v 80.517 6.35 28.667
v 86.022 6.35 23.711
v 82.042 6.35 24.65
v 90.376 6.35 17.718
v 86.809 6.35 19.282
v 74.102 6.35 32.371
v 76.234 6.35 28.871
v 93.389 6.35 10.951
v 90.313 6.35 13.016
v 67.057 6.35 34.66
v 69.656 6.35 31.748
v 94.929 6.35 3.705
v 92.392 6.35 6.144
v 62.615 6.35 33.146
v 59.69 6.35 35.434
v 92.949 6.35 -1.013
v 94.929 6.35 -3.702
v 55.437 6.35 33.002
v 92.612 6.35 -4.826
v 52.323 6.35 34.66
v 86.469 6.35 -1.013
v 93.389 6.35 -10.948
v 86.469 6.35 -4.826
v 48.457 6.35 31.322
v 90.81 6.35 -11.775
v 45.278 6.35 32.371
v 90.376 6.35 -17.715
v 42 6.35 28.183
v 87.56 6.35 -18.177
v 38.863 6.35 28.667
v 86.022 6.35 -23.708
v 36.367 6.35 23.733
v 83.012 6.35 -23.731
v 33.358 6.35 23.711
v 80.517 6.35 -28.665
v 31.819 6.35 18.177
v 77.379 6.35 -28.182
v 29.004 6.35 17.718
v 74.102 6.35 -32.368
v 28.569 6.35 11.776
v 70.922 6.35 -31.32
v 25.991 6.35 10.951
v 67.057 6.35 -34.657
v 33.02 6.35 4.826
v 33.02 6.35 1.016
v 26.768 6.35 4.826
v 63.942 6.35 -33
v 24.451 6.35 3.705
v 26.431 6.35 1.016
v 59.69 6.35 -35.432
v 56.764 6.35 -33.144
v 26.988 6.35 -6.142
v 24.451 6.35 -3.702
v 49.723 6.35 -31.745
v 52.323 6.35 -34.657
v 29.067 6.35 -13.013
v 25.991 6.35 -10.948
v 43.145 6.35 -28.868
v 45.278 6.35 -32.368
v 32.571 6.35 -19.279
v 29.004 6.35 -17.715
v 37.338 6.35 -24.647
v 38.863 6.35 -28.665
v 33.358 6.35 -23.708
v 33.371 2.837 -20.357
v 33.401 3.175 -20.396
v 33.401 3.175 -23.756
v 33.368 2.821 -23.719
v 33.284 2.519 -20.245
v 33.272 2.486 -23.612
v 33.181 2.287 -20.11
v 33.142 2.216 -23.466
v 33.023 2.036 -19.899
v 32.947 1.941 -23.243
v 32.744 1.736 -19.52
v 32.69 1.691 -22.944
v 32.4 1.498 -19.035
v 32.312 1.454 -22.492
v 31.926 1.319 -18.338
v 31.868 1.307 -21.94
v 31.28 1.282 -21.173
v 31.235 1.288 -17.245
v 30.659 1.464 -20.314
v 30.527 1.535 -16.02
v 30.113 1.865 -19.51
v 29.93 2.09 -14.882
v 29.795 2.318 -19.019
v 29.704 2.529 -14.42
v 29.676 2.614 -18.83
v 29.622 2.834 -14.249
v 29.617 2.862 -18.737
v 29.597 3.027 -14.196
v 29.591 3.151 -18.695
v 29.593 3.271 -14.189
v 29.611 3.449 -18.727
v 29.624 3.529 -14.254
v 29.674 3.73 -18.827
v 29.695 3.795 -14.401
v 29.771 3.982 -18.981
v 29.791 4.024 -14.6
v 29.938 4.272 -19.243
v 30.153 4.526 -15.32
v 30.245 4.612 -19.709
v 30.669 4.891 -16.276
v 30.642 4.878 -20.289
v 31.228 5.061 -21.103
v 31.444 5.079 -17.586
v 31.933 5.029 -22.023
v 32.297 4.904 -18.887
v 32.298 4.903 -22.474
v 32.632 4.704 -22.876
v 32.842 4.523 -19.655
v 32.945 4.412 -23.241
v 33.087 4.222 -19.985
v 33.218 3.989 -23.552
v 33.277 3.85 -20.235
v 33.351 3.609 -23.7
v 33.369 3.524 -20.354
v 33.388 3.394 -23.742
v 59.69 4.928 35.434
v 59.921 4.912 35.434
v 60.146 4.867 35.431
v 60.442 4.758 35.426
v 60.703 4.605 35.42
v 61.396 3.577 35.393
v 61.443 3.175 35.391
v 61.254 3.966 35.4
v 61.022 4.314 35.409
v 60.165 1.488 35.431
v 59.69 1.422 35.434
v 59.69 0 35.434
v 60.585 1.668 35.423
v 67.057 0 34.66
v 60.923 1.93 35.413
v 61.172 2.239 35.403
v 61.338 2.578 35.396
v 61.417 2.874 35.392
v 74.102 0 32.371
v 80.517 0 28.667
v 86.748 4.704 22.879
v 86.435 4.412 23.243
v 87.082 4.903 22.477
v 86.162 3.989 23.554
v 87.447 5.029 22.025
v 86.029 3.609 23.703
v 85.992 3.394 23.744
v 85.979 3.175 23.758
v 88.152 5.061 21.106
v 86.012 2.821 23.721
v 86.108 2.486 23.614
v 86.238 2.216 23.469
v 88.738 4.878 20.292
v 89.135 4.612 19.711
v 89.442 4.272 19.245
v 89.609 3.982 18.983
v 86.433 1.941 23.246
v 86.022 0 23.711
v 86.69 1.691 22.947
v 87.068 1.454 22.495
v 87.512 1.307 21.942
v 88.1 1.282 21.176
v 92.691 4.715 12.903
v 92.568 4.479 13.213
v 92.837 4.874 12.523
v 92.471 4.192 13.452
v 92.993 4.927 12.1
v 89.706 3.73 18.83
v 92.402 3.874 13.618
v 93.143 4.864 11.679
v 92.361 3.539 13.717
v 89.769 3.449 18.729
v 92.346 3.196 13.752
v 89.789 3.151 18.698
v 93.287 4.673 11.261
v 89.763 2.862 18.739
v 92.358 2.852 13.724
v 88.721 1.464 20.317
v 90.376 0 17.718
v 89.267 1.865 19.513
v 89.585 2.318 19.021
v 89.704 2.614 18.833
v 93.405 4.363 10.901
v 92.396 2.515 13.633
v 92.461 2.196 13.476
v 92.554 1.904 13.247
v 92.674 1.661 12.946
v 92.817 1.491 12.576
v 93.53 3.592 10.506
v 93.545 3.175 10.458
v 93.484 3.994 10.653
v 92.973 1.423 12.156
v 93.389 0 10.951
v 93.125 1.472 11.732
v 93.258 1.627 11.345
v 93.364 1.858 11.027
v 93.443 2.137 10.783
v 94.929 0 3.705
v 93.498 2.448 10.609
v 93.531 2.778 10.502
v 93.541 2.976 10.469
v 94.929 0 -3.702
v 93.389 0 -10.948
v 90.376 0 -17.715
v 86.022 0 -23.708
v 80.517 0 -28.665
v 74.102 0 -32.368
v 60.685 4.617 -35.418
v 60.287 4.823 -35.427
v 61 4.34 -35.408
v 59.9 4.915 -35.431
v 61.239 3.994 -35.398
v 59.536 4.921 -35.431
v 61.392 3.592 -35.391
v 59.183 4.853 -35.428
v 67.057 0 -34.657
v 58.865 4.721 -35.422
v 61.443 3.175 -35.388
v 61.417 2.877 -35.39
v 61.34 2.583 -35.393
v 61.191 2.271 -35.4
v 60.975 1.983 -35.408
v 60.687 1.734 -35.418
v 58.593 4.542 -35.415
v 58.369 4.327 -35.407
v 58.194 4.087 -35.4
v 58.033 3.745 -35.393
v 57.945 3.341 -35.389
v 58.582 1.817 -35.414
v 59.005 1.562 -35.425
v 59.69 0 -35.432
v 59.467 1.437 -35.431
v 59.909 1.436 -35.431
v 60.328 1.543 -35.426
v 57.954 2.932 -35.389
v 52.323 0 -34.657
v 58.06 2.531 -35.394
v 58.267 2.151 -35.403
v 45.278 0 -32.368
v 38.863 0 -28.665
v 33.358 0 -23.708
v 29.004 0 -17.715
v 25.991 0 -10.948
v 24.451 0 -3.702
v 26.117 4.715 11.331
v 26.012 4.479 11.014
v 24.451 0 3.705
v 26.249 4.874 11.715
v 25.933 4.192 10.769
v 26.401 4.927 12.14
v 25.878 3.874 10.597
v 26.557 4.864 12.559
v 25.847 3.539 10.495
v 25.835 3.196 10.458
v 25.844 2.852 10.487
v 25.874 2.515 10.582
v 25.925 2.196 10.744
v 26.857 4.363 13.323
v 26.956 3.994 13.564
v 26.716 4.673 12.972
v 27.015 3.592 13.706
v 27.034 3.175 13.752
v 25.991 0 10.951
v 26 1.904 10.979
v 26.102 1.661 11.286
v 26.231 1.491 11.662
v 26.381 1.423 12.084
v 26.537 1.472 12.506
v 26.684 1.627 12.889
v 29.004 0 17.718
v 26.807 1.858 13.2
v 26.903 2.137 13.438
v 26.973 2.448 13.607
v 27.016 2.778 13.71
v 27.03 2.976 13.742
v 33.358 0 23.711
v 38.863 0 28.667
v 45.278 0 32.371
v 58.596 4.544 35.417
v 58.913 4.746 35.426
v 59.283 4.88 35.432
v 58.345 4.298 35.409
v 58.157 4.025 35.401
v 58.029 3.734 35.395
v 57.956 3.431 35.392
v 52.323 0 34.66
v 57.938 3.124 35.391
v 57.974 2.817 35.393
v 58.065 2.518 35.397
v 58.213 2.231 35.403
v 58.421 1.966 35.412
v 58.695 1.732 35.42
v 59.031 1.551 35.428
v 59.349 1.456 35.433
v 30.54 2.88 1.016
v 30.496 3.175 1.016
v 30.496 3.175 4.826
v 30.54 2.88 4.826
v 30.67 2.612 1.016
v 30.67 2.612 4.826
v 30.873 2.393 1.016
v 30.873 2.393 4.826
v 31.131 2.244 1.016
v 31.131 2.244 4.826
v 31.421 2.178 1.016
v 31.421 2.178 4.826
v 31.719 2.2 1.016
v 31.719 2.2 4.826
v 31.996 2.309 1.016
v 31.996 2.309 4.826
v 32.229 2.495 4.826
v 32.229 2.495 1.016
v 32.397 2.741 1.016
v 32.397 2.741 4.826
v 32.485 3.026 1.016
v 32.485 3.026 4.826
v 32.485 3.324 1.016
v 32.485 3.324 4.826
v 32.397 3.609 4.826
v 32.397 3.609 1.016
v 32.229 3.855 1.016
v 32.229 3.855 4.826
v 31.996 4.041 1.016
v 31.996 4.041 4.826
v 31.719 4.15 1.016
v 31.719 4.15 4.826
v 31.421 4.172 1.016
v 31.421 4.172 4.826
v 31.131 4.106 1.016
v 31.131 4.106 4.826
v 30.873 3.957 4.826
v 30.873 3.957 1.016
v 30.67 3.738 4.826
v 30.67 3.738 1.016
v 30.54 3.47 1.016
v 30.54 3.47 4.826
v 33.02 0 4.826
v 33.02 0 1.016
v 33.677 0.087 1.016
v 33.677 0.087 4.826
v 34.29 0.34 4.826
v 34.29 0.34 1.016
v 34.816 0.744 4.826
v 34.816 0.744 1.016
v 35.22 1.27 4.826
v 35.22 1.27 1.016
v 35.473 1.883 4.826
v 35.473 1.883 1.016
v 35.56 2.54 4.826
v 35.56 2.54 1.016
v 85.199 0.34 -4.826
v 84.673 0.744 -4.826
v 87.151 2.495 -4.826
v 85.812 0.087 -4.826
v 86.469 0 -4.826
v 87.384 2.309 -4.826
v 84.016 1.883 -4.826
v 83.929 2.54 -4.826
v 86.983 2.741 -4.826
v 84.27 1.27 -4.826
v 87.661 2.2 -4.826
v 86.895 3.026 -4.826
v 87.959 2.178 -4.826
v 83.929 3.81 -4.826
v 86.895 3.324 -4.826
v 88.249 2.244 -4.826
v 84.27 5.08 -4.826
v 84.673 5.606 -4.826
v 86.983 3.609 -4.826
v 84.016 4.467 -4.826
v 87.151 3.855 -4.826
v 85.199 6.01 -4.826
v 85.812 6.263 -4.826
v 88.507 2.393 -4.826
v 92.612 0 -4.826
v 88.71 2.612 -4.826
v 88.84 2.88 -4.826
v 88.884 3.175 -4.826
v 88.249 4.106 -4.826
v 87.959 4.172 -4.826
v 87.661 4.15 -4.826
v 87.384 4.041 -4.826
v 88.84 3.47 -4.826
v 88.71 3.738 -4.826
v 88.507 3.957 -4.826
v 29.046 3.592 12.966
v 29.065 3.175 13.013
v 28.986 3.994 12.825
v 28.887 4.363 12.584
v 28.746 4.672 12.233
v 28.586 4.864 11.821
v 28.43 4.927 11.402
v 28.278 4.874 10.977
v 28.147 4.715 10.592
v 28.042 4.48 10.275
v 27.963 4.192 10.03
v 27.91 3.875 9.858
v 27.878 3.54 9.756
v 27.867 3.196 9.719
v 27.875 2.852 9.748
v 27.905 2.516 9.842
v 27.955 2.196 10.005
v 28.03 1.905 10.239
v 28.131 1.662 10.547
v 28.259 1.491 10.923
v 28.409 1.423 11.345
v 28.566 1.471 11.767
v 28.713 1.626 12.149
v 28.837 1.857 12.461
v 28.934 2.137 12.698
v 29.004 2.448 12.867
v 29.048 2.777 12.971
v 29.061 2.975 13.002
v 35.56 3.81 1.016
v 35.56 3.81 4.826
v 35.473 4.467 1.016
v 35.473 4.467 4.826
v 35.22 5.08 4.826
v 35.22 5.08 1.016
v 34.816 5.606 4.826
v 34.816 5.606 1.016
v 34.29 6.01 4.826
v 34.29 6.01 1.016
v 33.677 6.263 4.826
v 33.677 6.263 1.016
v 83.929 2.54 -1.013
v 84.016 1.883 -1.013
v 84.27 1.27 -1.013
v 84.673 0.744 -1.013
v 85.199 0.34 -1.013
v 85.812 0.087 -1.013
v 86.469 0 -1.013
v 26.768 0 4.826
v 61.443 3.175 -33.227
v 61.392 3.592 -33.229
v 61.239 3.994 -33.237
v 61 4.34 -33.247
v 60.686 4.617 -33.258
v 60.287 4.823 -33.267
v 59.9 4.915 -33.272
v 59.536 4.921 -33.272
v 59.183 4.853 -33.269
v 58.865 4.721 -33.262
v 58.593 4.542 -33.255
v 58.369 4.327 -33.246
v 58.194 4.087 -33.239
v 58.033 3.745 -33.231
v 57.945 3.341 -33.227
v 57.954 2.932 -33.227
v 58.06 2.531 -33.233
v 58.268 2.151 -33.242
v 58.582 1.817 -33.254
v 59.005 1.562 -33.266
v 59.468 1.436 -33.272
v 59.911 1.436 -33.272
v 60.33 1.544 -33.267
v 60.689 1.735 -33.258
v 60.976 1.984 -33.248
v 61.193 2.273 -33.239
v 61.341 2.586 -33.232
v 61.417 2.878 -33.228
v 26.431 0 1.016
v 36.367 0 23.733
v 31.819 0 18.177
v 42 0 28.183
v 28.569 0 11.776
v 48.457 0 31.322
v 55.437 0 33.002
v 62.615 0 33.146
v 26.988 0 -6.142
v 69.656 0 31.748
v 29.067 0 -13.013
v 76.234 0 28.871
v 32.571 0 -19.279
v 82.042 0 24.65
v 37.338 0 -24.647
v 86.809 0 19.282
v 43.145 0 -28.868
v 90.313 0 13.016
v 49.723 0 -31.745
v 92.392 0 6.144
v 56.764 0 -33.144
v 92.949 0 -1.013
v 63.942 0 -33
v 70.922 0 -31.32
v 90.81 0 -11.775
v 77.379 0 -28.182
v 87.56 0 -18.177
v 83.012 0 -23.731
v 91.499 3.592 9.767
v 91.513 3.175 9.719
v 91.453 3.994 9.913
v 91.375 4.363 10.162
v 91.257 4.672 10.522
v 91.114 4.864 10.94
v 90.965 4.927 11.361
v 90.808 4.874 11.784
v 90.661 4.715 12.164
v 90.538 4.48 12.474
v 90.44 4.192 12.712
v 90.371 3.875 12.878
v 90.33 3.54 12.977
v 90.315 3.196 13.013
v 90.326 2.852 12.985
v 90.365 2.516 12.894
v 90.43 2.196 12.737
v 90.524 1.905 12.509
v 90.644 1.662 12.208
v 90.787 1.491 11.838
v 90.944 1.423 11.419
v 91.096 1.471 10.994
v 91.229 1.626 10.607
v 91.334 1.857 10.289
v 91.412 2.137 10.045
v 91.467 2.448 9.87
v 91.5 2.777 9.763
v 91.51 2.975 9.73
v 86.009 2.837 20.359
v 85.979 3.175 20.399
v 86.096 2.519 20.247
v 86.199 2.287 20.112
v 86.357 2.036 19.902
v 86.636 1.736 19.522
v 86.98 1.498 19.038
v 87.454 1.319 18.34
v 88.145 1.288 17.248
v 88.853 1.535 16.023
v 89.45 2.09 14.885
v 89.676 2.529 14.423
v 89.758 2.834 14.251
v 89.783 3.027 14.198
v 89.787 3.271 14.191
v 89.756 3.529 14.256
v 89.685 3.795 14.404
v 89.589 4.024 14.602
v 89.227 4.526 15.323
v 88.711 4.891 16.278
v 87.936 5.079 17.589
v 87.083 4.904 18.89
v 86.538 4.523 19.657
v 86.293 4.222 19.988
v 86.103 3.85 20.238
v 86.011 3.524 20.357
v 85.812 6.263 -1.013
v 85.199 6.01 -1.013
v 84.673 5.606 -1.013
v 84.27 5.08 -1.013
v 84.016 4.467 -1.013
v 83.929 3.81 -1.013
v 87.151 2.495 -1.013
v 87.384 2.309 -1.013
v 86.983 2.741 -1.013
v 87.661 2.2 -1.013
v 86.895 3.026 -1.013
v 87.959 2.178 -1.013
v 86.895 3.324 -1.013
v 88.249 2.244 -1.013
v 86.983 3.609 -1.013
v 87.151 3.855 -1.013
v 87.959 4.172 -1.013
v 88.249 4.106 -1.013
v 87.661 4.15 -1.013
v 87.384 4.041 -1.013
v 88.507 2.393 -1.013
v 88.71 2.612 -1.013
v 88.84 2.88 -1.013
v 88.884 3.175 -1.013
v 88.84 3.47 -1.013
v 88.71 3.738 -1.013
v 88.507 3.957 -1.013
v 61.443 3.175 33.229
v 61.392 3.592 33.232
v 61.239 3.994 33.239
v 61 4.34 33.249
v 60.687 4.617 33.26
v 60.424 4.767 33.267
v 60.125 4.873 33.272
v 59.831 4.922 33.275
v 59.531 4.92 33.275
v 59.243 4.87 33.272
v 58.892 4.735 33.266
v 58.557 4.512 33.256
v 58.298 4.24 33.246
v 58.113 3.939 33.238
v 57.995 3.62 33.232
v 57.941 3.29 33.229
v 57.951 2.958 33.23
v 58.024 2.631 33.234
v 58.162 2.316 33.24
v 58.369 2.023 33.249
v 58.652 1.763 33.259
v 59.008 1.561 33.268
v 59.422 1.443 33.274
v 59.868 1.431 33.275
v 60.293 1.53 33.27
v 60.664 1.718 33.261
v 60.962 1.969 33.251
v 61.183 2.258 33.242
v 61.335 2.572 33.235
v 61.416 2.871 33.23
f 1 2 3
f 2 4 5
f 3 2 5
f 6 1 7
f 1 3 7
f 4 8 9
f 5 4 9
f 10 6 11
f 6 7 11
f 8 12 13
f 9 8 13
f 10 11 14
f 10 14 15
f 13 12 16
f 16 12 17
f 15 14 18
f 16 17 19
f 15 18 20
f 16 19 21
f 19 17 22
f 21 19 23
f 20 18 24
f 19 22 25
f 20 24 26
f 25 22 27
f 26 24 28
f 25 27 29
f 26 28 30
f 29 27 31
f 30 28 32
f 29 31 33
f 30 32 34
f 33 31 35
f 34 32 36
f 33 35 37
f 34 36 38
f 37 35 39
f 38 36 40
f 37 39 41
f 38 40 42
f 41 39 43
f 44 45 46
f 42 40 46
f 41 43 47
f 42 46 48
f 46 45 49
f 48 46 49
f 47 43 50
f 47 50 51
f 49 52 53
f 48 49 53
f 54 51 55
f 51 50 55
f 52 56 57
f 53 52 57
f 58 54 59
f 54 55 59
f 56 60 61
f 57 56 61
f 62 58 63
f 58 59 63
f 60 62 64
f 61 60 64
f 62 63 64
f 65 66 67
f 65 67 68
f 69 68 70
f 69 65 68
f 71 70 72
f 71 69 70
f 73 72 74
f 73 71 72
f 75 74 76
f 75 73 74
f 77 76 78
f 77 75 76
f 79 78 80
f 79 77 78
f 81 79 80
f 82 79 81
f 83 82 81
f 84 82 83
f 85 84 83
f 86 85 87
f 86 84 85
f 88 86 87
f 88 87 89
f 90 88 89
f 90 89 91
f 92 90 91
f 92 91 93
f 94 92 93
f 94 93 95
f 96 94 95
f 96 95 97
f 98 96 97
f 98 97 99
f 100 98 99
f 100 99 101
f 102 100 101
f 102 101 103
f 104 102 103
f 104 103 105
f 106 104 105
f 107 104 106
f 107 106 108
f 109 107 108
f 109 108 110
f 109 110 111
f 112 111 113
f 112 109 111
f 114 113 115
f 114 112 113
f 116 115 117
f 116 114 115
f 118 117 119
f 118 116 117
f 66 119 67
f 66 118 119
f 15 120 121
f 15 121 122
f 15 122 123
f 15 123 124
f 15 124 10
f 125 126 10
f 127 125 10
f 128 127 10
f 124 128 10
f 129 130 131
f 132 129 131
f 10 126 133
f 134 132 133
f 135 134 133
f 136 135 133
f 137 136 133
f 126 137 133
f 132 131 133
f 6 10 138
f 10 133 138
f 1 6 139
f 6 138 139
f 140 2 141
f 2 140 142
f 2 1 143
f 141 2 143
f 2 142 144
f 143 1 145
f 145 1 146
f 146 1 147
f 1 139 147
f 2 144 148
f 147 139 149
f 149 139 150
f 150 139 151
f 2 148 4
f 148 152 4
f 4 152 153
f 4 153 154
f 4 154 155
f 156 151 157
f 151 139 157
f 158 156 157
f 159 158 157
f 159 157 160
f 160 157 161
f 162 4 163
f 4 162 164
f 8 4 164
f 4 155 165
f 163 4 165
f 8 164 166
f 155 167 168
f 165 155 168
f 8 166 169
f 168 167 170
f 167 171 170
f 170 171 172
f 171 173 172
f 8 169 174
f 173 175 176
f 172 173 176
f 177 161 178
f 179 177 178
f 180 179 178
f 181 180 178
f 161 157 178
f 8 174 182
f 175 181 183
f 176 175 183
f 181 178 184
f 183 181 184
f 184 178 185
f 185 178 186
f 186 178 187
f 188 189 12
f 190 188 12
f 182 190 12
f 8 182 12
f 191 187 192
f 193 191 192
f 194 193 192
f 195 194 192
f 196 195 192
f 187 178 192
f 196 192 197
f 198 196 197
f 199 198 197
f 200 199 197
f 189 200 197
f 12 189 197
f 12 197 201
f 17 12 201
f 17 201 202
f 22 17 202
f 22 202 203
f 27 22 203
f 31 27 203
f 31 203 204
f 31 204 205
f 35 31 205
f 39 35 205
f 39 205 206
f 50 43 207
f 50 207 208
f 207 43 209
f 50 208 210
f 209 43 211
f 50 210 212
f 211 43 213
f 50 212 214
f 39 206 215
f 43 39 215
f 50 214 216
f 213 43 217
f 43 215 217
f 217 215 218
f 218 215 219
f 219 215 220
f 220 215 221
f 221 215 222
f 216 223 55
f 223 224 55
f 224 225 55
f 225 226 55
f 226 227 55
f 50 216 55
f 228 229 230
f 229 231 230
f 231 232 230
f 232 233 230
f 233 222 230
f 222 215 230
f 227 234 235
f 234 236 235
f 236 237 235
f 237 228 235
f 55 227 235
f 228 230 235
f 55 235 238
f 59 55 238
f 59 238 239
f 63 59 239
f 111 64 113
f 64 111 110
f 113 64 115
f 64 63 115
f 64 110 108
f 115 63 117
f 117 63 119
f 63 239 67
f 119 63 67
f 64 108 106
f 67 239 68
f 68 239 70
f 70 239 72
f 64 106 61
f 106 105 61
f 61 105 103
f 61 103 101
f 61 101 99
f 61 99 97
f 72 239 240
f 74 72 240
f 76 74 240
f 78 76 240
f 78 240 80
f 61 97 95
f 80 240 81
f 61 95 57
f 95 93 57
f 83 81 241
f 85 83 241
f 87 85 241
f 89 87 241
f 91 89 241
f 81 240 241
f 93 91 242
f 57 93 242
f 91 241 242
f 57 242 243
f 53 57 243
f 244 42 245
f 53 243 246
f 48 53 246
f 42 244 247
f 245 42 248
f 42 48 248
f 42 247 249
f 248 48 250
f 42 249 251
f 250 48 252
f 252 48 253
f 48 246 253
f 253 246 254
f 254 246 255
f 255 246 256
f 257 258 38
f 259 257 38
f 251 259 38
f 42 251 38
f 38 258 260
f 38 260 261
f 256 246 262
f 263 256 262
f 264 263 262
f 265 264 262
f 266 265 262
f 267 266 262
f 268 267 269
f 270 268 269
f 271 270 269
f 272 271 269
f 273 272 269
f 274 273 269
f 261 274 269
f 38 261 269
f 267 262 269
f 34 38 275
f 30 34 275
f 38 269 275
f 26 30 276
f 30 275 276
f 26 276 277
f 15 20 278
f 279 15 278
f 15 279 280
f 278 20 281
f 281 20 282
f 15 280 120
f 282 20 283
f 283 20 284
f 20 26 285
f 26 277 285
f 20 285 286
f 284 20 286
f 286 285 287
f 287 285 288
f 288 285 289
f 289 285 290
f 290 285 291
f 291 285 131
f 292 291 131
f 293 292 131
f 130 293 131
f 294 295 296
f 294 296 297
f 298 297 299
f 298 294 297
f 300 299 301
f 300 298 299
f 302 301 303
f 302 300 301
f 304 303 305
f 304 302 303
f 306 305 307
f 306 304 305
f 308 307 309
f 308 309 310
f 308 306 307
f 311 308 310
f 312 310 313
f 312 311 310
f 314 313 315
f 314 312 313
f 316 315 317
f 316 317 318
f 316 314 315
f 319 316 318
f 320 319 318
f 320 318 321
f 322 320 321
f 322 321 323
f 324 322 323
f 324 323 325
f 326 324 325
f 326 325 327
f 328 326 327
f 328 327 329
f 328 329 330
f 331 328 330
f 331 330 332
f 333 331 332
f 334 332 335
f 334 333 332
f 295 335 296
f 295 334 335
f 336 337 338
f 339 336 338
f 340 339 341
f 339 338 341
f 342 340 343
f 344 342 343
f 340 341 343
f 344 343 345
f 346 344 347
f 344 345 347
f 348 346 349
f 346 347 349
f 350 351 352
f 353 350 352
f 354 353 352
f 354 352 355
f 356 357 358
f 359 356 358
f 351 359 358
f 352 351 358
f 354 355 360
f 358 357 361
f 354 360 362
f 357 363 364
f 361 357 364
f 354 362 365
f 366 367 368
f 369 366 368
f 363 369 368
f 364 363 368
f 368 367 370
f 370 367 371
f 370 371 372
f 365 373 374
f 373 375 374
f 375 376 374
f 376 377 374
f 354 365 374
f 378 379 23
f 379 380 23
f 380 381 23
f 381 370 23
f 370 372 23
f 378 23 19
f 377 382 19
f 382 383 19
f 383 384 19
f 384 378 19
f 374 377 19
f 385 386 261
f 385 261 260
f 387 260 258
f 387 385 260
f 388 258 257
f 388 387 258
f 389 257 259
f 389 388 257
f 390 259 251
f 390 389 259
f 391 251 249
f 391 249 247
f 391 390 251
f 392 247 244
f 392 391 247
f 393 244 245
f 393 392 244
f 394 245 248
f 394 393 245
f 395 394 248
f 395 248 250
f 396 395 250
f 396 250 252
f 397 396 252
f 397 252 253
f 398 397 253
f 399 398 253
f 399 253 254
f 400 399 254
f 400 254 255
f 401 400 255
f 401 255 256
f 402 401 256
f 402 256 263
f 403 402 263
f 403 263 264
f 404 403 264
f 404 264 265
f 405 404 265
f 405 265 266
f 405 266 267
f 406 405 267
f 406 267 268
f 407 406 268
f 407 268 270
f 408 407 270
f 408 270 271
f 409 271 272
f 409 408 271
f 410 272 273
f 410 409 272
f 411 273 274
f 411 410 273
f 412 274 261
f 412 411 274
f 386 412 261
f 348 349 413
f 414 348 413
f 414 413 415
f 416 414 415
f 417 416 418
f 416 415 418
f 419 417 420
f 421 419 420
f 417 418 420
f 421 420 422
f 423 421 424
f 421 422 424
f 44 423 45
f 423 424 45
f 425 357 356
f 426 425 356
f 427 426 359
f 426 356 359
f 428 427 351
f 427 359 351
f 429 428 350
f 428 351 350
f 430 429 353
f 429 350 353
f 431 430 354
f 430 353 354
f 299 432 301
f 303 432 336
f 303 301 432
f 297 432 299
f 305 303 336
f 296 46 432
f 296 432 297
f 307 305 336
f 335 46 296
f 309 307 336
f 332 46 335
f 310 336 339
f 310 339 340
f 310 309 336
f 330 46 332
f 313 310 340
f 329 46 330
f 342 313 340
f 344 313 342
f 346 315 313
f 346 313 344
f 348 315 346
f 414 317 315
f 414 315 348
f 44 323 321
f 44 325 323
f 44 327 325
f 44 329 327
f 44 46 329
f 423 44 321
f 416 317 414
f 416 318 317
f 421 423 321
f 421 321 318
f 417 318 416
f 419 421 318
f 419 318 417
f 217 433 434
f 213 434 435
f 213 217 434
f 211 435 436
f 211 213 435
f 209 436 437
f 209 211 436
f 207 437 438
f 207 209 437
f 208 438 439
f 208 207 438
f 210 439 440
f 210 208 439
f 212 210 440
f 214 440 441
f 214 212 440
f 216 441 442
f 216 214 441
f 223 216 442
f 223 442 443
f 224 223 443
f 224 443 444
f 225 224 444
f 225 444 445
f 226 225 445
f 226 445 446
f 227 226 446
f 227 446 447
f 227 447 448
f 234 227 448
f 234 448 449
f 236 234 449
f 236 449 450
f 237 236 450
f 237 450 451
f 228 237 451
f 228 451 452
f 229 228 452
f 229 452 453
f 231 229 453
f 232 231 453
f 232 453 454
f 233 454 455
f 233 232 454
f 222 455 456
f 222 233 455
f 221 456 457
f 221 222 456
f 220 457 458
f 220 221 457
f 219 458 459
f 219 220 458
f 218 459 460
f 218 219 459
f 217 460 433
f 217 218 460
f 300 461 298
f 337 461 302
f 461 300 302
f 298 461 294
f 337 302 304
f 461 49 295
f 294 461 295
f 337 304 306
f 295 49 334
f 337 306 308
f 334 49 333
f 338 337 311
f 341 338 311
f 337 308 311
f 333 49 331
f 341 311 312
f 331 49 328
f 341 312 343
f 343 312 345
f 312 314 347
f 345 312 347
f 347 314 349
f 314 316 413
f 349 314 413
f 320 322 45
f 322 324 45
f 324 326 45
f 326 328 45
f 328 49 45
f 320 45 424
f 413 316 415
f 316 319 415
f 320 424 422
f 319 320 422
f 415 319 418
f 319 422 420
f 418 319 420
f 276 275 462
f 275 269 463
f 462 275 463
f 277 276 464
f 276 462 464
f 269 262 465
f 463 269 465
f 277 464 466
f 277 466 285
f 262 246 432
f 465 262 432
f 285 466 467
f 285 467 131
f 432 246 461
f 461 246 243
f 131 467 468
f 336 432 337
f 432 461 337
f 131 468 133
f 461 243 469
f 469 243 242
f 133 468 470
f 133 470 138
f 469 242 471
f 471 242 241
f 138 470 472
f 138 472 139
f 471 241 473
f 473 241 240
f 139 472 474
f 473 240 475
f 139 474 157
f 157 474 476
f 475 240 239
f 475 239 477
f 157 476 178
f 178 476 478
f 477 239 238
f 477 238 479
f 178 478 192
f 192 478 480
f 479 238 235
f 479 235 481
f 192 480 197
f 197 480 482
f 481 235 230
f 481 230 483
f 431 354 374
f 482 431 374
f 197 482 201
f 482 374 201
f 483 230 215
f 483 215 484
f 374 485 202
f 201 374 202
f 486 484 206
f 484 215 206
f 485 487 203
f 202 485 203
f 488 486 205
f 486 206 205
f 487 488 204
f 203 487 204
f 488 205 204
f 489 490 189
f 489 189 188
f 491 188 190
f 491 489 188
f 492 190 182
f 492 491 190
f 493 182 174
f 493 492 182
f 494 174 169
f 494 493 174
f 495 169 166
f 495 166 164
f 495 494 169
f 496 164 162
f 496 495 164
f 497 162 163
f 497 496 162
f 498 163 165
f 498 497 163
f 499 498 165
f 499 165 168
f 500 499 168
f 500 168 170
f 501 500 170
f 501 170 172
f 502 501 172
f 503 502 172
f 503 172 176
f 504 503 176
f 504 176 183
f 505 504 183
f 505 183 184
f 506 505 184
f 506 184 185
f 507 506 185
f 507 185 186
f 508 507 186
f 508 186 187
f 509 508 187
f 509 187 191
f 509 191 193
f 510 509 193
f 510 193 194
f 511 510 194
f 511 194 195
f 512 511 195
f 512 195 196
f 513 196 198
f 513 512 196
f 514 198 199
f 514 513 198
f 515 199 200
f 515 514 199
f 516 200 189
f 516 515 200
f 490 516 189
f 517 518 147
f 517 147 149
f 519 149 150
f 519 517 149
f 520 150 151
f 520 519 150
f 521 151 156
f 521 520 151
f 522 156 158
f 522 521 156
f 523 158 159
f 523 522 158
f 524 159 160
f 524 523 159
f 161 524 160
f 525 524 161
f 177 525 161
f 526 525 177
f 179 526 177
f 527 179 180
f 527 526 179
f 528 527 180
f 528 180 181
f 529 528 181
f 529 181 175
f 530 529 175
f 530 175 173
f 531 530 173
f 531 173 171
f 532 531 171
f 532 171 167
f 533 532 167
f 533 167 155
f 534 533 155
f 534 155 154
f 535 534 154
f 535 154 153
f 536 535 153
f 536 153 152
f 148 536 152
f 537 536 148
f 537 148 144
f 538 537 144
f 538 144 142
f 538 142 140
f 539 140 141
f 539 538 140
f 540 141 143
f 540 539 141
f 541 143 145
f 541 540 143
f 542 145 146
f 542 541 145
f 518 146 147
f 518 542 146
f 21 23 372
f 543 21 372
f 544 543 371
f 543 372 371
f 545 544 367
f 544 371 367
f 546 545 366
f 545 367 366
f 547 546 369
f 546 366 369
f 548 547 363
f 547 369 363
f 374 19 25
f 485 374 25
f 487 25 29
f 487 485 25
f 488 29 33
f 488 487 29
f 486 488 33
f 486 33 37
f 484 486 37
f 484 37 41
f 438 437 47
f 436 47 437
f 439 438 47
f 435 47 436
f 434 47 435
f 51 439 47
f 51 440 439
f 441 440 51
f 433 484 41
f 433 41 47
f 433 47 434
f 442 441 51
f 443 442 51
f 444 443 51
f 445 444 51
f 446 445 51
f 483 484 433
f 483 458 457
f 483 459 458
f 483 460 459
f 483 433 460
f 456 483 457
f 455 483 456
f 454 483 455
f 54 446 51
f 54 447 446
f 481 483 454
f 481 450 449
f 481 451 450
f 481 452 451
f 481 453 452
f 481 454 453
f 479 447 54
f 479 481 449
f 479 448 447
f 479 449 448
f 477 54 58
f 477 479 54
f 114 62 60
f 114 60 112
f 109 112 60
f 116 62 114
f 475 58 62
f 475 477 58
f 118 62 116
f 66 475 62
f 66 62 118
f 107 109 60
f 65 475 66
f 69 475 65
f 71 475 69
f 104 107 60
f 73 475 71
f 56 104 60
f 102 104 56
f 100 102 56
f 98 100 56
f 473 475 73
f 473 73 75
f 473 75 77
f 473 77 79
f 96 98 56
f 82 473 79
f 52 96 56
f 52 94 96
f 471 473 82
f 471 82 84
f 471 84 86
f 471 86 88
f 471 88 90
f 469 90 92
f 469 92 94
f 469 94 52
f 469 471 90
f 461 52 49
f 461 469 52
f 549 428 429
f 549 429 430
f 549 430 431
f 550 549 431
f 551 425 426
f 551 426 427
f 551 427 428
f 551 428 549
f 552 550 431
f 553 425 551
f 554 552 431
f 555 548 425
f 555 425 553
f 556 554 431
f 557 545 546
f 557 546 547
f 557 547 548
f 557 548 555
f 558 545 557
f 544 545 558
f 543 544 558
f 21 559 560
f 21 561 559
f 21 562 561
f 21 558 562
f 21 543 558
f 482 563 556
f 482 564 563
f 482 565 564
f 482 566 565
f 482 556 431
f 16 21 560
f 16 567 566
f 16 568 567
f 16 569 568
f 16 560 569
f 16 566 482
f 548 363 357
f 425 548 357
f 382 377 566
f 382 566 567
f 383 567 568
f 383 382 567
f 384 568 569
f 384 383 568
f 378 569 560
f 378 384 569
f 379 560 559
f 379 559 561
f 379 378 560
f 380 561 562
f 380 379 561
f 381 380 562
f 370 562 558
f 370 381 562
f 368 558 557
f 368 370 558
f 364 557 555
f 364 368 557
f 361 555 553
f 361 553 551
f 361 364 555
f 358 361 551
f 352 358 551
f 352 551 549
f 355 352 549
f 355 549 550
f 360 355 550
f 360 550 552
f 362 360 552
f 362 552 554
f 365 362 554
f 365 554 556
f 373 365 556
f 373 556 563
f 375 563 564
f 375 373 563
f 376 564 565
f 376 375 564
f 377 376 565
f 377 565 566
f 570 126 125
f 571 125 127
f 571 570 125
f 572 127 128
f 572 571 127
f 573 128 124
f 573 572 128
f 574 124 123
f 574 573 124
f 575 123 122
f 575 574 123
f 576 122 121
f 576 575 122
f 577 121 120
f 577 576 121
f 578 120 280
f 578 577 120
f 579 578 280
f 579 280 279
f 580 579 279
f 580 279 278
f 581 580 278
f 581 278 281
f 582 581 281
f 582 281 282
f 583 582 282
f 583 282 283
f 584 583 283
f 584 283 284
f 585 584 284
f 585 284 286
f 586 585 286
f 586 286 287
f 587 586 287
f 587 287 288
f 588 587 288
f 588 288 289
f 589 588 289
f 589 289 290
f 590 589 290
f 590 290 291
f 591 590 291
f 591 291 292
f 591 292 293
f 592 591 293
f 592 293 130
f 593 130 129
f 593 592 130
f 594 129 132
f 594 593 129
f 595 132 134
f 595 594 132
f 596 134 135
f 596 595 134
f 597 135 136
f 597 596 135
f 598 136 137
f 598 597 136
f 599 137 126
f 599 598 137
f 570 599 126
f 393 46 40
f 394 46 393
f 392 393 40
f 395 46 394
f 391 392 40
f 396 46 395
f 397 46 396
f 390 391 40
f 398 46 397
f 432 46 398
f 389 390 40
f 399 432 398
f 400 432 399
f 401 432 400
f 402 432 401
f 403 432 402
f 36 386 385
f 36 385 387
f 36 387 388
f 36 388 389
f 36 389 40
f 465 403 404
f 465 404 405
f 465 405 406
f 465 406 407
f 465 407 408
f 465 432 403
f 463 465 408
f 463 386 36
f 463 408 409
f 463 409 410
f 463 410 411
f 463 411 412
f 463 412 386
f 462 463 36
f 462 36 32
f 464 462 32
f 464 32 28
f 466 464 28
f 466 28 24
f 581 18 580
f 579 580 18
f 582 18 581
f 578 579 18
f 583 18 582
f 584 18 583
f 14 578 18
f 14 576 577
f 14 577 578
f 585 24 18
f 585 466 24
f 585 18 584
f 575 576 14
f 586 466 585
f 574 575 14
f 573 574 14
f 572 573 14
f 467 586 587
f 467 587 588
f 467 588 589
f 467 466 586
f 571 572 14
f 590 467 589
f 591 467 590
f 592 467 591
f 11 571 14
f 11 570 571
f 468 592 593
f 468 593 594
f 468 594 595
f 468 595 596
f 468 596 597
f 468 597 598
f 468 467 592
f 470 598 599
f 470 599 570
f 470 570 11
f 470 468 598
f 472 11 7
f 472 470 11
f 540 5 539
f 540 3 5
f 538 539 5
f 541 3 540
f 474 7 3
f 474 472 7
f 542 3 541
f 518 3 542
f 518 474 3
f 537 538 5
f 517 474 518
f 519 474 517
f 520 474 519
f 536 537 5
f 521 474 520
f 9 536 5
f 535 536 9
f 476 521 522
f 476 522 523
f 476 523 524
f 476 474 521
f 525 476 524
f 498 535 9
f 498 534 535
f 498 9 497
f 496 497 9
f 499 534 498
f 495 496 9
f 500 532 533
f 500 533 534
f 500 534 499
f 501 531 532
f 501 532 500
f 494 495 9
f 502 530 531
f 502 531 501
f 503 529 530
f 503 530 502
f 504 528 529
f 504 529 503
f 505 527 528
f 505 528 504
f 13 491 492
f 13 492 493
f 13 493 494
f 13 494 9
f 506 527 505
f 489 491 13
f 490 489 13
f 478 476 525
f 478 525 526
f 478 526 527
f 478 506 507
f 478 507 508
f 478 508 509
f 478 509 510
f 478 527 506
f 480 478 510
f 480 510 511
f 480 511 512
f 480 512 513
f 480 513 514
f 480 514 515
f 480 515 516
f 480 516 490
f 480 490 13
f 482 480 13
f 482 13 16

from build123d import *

# Parameters (mm, degrees)
SKETCH1_R                       = 35.433
SKETCH1_R_2                     = 33.274
BOSS_EXTRUDE1_DEPTH             = 6.35
BOSS_EXTRUDE2_START             = 1.016
SKETCH2_R                       = 1
BOSS_EXTRUDE2_DEPTH             = 3.81
BOSS_EXTRUDE3_DEPTH             = 0.00254
BOSS_EXTRUDE3_DEPTH_BACK        = 3.81
BOSS_EXTRUDE3_START             = -1.016
SKETCH3_R                       = 1
CUT_EXTRUDE1_START              = 27.94
SKETCH4_R                       = 1.7526
CUT_EXTRUDE1_DEPTH              = 17.272
CIRPATTERN1_COUNT               = 2
CIRPATTERN1_ANGLE               = 70
CIRPATTERN1_THE_OTHER_WAY_COUNT = 2
CIRPATTERN1_THE_OTHER_WAY_ANGLE = 70
CUT_EXTRUDE2_START              = -42.164
SKETCH5_R                       = 1.7526
CUT_EXTRUDE2_DEPTH              = 42.164
SKETCH6_R                       = 1.905
CUT_EXTRUDE3_DEPTH              = 40.386
SKETCH7_R                       = 1.905
CUT_EXTRUDE4_DEPTH              = 38.1


with BuildPart() as part:
    # Sketch1 → Boss-Extrude1 (new body)
    with BuildSketch(Plane(origin=(0, 0, 0.20701), x_dir=(1, 0, 0), z_dir=(0, 1, 0))):
        with Locations(Location((59.69, 0.20574, 0), (0, 0, 270))):
            Circle(SKETCH1_R)
        with Locations(Location((59.69, 0.20574, 0), (0, 0, 270))):
            Circle(SKETCH1_R_2, mode=Mode.SUBTRACT)
    extrude(amount=BOSS_EXTRUDE1_DEPTH)

    # Sketch2 → Boss-Extrude2 (add)
    with BuildSketch(Plane.XY.offset(BOSS_EXTRUDE2_START)):
        with BuildLine():
            Line((33.02, 6.35), (25.4, 6.35))
            Line((25.4, 6.35), (25.4, 0))
            Line((25.4, 0), (33.02, 0))
            ThreePointArc((33.02, 0), (34.816051224, 0.743948776), (35.56, 2.54))
            Line((35.56, 2.54), (35.56, 3.81))
            ThreePointArc((35.56, 3.81), (34.816051224, 5.606051224), (33.02, 6.35))
        make_face()
        with Locations(Location((31.496, 3.175, 0), (0, 0, 180))):
            Circle(SKETCH2_R, mode=Mode.SUBTRACT)
    extrude(amount=BOSS_EXTRUDE2_DEPTH)

    # Sketch3 → Boss-Extrude3 (add, two sides: drawn at the far end of the back side and taken through both)
    with BuildSketch(Plane.XY.offset(BOSS_EXTRUDE3_START - BOSS_EXTRUDE3_DEPTH_BACK)):
        with BuildLine():
            Line((93.98, 6.35), (86.469496204, 6.35))
            ThreePointArc((86.469496204, 6.35), (84.67344498, 5.606051224), (83.929496204, 3.81))
            Line((83.929496204, 3.81), (83.929496204, 2.54))
            ThreePointArc((83.929496204, 2.54), (84.67344498, 0.743948776), (86.469496204, 0))
            Line((86.469496204, 0), (93.98, 0))
            Line((93.98, 0), (93.98, 6.35))
        make_face()
        with Locations((87.884, 3.175)):
            Circle(SKETCH3_R, mode=Mode.SUBTRACT)
    extrude(amount=BOSS_EXTRUDE3_DEPTH + BOSS_EXTRUDE3_DEPTH_BACK)

    # Sketch4 → Cut-Extrude1 (cut)
    with BuildSketch(Plane.XY.offset(CUT_EXTRUDE1_START)):
        with Locations((59.69, 3.175)):
            Circle(SKETCH4_R)
    cut_extrude1 = extrude(amount=CUT_EXTRUDE1_DEPTH, mode=Mode.SUBTRACT)

    # CirPattern1: Cut-Extrude1 ×2 about axis
    cirpattern1_axis = Axis((59.69, 0, 0.00127), (0, -1, 0))
    for i in range(1, CIRPATTERN1_COUNT):
        add(cut_extrude1.rotate(cirpattern1_axis, i * CIRPATTERN1_ANGLE / (CIRPATTERN1_COUNT - 1)), mode=Mode.SUBTRACT)

    # CirPattern1 the other way: Cut-Extrude1 ×2 about axis
    cirpattern1_the_other_way_axis = Axis((59.69, 0, 0.00127), (0, 1, 0))
    for i in range(1, CIRPATTERN1_THE_OTHER_WAY_COUNT):
        add(cut_extrude1.rotate(cirpattern1_the_other_way_axis, i * CIRPATTERN1_THE_OTHER_WAY_ANGLE / (CIRPATTERN1_THE_OTHER_WAY_COUNT - 1)), mode=Mode.SUBTRACT)

    # Sketch5 → Cut-Extrude2 (cut)
    with BuildSketch(Plane.XY.offset(CUT_EXTRUDE2_START)):
        with Locations((59.69, 3.175)):
            Circle(SKETCH5_R)
    extrude(amount=CUT_EXTRUDE2_DEPTH, mode=Mode.SUBTRACT)

    # Sketch6 → Cut-Extrude3 (cut)
    with BuildSketch(Plane.XY.offset(-1.01346)):
        with Locations(Location((87.884, 3.175, 0), (0, 0, 180))):
            Circle(SKETCH6_R)
    extrude(amount=CUT_EXTRUDE3_DEPTH, mode=Mode.SUBTRACT)

    # Sketch7 → Cut-Extrude4 (cut)
    with BuildSketch(Plane(origin=(0, 0, 1.016), x_dir=(-1, 0, 0), z_dir=(0, 0, -1))):
        with Locations(Location((-31.496, 3.175, 0), (0, 0, 180))):
            Circle(SKETCH7_R)
    extrude(amount=CUT_EXTRUDE4_DEPTH, mode=Mode.SUBTRACT)


solid = part.part
